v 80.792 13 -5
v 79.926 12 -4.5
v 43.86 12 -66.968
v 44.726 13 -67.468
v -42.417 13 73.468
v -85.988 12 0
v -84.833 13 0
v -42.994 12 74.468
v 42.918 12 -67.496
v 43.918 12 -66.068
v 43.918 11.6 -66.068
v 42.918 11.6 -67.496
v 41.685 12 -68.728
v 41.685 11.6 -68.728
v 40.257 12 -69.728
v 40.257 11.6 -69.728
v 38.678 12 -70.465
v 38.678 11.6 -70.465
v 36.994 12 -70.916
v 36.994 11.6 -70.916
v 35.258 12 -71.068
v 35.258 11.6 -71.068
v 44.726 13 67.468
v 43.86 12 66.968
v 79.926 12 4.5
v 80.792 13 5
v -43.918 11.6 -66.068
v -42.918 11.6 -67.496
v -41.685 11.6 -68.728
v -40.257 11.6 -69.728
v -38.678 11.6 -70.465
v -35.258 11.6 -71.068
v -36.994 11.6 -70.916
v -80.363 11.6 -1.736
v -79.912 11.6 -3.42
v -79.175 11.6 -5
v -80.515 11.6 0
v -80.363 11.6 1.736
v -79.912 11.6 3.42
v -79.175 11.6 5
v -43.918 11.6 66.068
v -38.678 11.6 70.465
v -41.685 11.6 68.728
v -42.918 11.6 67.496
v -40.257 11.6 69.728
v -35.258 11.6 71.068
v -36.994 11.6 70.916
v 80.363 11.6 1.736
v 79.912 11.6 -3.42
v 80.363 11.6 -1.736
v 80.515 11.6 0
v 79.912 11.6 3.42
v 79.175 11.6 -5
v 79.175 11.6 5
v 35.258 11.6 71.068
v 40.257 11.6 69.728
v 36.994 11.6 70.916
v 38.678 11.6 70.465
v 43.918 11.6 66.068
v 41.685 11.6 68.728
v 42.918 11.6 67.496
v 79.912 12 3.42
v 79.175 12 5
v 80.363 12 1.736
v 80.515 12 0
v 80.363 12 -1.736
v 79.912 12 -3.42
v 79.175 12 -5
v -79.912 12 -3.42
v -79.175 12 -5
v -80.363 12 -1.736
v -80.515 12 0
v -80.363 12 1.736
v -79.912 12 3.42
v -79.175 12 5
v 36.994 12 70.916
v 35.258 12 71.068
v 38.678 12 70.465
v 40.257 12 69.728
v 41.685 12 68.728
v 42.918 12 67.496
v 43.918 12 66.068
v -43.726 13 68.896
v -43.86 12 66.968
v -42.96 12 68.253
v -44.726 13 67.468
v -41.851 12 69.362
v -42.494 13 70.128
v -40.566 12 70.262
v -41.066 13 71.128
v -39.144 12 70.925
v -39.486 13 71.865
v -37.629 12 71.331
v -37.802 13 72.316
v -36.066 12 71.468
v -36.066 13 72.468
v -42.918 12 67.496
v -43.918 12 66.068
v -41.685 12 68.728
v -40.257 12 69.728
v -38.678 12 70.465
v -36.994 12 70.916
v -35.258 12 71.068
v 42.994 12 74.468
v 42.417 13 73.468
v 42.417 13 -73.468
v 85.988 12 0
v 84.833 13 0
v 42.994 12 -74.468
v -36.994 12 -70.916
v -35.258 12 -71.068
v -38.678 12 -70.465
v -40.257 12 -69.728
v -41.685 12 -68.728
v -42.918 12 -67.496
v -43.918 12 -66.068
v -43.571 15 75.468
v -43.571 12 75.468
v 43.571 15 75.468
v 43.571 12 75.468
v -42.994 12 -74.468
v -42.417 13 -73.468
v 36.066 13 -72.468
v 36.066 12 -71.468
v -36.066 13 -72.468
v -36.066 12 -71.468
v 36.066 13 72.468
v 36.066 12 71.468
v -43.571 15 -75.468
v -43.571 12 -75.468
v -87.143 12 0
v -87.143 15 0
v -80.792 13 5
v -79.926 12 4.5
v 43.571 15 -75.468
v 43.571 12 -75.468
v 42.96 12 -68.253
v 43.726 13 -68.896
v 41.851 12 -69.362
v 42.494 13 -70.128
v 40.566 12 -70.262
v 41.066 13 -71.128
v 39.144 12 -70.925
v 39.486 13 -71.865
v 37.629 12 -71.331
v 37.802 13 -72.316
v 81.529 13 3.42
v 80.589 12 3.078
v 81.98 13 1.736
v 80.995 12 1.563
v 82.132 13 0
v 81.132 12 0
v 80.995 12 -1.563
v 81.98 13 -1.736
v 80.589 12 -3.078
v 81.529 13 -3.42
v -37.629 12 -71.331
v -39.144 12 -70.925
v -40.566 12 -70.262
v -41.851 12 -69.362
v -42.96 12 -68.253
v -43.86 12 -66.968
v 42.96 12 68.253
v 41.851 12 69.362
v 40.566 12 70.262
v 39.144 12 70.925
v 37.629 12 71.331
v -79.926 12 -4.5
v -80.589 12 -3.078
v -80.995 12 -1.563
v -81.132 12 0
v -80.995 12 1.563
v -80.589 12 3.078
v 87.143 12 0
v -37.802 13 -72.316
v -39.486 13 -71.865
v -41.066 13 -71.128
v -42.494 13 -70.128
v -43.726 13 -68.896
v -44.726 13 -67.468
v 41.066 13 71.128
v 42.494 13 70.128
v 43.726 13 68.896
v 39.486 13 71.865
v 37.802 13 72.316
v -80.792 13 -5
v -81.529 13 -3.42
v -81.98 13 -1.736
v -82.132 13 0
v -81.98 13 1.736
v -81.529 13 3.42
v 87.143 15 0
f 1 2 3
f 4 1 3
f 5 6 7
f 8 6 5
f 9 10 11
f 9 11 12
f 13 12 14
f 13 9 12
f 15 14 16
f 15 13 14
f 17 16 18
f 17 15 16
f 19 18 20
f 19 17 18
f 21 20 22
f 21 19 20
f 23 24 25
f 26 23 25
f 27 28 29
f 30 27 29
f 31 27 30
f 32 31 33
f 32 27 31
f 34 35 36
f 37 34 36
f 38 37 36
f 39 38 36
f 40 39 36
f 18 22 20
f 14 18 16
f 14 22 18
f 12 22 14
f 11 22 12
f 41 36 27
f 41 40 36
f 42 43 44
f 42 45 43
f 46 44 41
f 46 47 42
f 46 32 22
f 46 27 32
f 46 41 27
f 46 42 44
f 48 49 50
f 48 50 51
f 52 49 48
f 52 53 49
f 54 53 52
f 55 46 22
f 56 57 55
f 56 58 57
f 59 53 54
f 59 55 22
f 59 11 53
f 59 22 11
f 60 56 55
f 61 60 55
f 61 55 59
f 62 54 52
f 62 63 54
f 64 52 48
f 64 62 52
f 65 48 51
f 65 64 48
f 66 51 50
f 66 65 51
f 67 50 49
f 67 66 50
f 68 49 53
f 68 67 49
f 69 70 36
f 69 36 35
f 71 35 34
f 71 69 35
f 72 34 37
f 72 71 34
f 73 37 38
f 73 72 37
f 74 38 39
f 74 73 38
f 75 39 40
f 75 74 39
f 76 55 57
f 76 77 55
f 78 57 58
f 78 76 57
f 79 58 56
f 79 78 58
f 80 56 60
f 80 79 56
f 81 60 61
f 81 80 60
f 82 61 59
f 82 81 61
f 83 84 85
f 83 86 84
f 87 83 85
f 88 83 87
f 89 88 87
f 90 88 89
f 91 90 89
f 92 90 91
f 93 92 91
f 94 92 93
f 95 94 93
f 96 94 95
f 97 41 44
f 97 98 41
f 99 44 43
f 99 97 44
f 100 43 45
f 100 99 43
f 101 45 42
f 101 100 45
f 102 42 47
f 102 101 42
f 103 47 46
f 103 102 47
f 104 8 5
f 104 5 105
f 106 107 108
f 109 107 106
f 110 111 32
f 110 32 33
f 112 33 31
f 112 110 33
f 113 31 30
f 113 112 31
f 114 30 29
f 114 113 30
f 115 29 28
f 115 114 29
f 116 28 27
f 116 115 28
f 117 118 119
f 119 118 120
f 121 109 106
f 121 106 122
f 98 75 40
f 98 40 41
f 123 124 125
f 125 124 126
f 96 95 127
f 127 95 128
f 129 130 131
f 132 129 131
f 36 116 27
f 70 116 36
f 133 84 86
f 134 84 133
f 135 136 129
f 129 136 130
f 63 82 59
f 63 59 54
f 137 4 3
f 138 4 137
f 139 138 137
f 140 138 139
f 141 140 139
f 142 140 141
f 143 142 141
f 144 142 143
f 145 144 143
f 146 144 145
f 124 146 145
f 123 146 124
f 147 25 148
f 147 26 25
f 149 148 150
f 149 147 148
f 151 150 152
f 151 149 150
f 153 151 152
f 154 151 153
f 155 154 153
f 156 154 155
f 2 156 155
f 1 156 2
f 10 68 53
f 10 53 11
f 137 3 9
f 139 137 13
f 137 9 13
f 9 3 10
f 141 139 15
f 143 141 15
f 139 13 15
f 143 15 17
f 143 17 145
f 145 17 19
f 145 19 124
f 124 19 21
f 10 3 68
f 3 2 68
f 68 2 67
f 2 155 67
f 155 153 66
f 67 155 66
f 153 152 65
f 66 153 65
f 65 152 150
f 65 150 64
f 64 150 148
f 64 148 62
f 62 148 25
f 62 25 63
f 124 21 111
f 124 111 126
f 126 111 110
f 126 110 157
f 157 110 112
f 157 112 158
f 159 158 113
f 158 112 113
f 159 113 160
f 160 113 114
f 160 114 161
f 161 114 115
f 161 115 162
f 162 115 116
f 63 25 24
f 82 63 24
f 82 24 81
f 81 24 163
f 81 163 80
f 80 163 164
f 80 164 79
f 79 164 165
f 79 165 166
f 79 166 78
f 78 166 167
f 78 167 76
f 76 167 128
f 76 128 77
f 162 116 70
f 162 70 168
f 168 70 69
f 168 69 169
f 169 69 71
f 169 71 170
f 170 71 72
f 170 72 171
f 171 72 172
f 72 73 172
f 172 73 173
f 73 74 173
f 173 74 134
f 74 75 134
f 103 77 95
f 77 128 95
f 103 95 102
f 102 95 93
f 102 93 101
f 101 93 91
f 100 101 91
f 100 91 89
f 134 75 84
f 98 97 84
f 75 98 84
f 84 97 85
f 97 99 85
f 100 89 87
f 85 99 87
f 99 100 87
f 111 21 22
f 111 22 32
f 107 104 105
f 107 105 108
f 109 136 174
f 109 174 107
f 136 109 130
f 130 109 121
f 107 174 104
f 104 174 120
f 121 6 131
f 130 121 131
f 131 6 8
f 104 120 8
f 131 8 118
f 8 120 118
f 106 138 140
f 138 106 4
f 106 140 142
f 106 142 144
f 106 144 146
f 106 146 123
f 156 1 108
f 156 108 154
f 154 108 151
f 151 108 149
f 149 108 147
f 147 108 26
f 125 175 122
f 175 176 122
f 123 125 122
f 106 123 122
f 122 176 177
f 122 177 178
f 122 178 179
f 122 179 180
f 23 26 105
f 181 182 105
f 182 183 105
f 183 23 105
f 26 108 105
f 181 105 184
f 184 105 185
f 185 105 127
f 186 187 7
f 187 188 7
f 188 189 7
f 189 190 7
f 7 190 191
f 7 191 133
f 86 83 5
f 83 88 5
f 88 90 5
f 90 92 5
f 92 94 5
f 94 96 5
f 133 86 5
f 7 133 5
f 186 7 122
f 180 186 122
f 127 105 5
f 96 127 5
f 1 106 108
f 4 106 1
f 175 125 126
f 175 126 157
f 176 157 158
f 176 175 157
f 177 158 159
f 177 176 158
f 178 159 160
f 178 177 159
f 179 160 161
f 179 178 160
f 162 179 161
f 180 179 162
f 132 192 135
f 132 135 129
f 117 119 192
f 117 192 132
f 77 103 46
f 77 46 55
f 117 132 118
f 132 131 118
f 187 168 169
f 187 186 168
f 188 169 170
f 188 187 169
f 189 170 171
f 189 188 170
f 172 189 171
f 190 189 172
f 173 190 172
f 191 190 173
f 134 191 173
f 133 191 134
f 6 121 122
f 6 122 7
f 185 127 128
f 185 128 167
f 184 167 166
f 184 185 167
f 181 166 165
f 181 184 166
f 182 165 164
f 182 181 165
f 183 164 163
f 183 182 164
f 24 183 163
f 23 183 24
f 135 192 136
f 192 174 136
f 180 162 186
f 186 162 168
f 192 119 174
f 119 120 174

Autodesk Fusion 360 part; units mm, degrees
sketch "Sketch1" plane through (0, 12, 0) normal (0, -1, 0) x (1, 0, 0)
  line L0 (-41.8393, 72.4678) -> (-83.6786, 0)
  line L1 (-83.6786, 0) -> (-41.8393, -72.4678)
  line L2 (-41.8393, -72.4678) -> (41.8393, -72.4678)
  line L3 (41.8393, -72.4678) -> (83.6786, 0)
  line L4 (83.6786, 0) -> (41.8393, 72.4678)
  line L5 (41.8393, 72.4678) -> (-41.8393, 72.4678)
  line L6 (-41.8393, 72.4678) -> (41.8393, 72.4678)
  line L7 (41.8393, 72.4678) -> (83.6786, 0)
  line L8 (83.6786, 0) -> (41.8393, -72.4678)
  line L9 (41.8393, -72.4678) -> (-41.8393, -72.4678)
  line L10 (-41.8393, -72.4678) -> (-83.6786, 0)
  line L11 (-83.6786, 0) -> (-41.8393, 72.4678)
  line L12 (82.0621, 0) -> (41.031, -71.0678)
  line L13 (41.031, -71.0678) -> (-41.031, -71.0678)
  line L14 (-41.031, -71.0678) -> (-82.0621, 0)
  line L15 (-82.0621, 0) -> (-41.031, 71.0678)
  line L16 (-41.031, 71.0678) -> (41.031, 71.0678)
  line L17 (41.031, 71.0678) -> (82.0621, 0)
  dimension "d1" = 1.4
sketch "Sketch2" plane through (0, 12, 0) normal (0, 1, 0) x (-1, 0, 0)
  line L0 (-42.4167, 73.4678) -> (42.4167, 73.4678)
  line L1 (42.4167, 73.4678) -> (84.8333, 0)
  line L2 (84.8333, 0) -> (42.4167, -73.4678)
  line L3 (42.4167, -73.4678) -> (-42.4167, -73.4678)
  line L4 (-42.4167, -73.4678) -> (-84.8333, 0)
  line L5 (-84.8333, 0) -> (-42.4167, 73.4678)
  line L6 (-43.5714, 75.4678) -> (-87.1427, 0)
  line L7 (-87.1427, 0) -> (-43.5714, -75.4678)
  line L8 (-43.5714, -75.4678) -> (43.5714, -75.4678)
  line L9 (43.5714, -75.4678) -> (87.1427, 0)
  line L10 (87.1427, 0) -> (43.5714, 75.4678)
  line L11 (43.5714, 75.4678) -> (-43.5714, 75.4678)
  line L12 (-43.5714, 75.4678) -> (43.5714, 75.4678)
  line L13 (87.1427, 0) -> (43.5714, 75.4678)
  line L14 (87.1427, 0) -> (43.5714, -75.4678)
  line L15 (43.5714, -75.4678) -> (-43.5714, -75.4678)
  line L16 (-43.5714, -75.4678) -> (-87.1427, 0)
  line L17 (-87.1427, 0) -> (-43.5714, 75.4678)
sketch "Sketch3" plane through (0, 4, 0) normal (0, 1, 0) x (-1, 0, 0)
  line L0 (-38.9526, -67.4678) -> (-77.9051, 0)
  line L1 (-77.9051, 0) -> (-38.9526, 67.4678)
  line L2 (-38.9526, 67.4678) -> (38.9526, 67.4678)
  line L3 (38.9526, 67.4678) -> (77.9051, 0)
  line L4 (77.9051, 0) -> (38.9526, -67.4678)
  line L5 (38.9526, -67.4678) -> (-38.9526, -67.4678)
  line L6 (-84.8333, 0) -> (-42.4167, -73.4678)
  line L7 (-42.4167, -73.4678) -> (42.4167, -73.4678)
  line L8 (42.4167, -73.4678) -> (84.8333, 0)
  line L9 (84.8333, 0) -> (42.4167, 73.4678)
  line L10 (42.4167, 73.4678) -> (-42.4167, 73.4678)
  line L11 (-42.4167, 73.4678) -> (-84.8333, 0)
  line L12 (42.4167, -73.4678) -> (84.8333, 0)
  line L13 (42.4167, 73.4678) -> (84.8333, 0)
  line L14 (42.4167, 73.4678) -> (-42.4167, 73.4678)
  line L15 (-42.4167, 73.4678) -> (-84.8333, 0)
  line L16 (-84.8333, 0) -> (-42.4167, -73.4678)
  line L17 (-42.4167, -73.4678) -> (42.4167, -73.4678)
  line L18 (-42.4167, 73.4678) -> (-84.8333, 0)
  line L19 (-41.8393, -72.4678) -> (41.8393, -72.4678)
  line L20 (41.8393, -72.4678) -> (83.6786, 0)
  line L21 (41.8393, 72.4678) -> (83.6786, 0)
  line L22 (41.8393, 72.4678) -> (-41.8393, 72.4678)
  line L23 (-41.8393, 72.4678) -> (-83.6786, 0)
  line L24 (-83.6786, 0) -> (-41.8393, -72.4678)
  line L25 (41.031, 71.0678) -> (-41.031, 71.0678)
  line L26 (-41.031, 71.0678) -> (-82.0621, 0)
  line L27 (-82.0621, 0) -> (-41.031, -71.0678)
  line L28 (-41.031, -71.0678) -> (41.031, -71.0678)
  line L29 (41.031, -71.0678) -> (82.0621, 0)
  line L30 (41.031, 71.0678) -> (82.0621, 0)
  dimension "d2" = -1
  dimension "d3" = -2.4
sketch "Sketch4" plane through (0, 13, 0) normal (0, -1, 0) x (1, 0, 0)
  arc A0 (44.7261, 67.4678) -> (36.0658, 72.4678) centre (36.0658, 62.4678) ccw
  line L0 (44.7261, 67.4678) -> (80.7919, 5)
  arc A1 (80.7919, -5) -> (80.7919, 5) centre (72.1316, 0) ccw
  line L1 (80.7919, -5) -> (44.7261, -67.4678)
  arc A2 (36.0658, -72.4678) -> (44.7261, -67.4678) centre (36.0658, -62.4678) ccw
  line L2 (36.0658, -72.4678) -> (-36.0658, -72.4678)
  arc A3 (-44.7261, -67.4678) -> (-36.0658, -72.4678) centre (-36.0658, -62.4678) ccw
  line L3 (-44.7261, -67.4678) -> (-80.7919, -5)
  arc A4 (-80.7919, 5) -> (-80.7919, -5) centre (-72.1316, 0) ccw
  line L4 (-80.7919, 5) -> (-44.7261, 67.4678)
  arc A5 (-36.0658, 72.4678) -> (-44.7261, 67.4678) centre (-36.0658, 62.4678) ccw
  line L5 (-36.0658, 72.4678) -> (36.0658, 72.4678)
  line L6 (42.4167, 73.4678) -> (-42.4167, 73.4678)
  line L7 (-42.4167, 73.4678) -> (-84.8333, 0)
  line L8 (-84.8333, 0) -> (-42.4167, -73.4678)
  line L9 (-42.4167, -73.4678) -> (42.4167, -73.4678)
  line L10 (42.4167, -73.4678) -> (84.8333, 0)
  line L11 (84.8333, 0) -> (42.4167, 73.4678)
  line L12 (-42.4167, 73.4678) -> (-32.4167, 73.4678)
  line L13 (-42.4167, 73.4678) -> (-47.4167, 64.8076)
  line L14 (-32.4167, 73.4678) -> (-32.4167, 56.1473)
  line L15 (-47.4167, 64.8076) -> (-32.4167, 56.1473)
  dimension "d4" = 10
  dimension "d5" = 0
extrude "Extrude1" add sketch "Sketch2" along normal blind 3 contours L0 L1 L2 L3 L4 L5 | L6 L7 L8 L9 L10 L11 L12 L13 L14 L15 L16 L17
extrude "Extrude2" cut sketch "Sketch3" along normal blind -1 and the other way blind -9 contours L6 L7 L8 L9 L10 L11 L12 L13 L14 L15 L16 L17 L18
move_face "OffsetFaces1" [suppressed]
extrude "Extrude3" cut sketch "Sketch1" against normal blind 2.6 contours L12 L13 L14 L15 L16 L17
fillet "Fillet1" radius 10 6 edges at (-83.6786, 12.5, 0) (-41.8393, 12.5, 72.4678) (41.8393, 12.5, 72.4678) (83.6786, 12.5, 0) (41.8393, 12.5, -72.4678) (-41.8393, 12.5, -72.4678)
fillet "Fillet1" radius 10 6 edges at (-41.031, 13.3, 71.0678) (-82.0621, 13.3, 0) (-41.031, 13.3, -71.0678) (41.031, 13.3, -71.0678) (82.0621, 13.3, 0) (41.031, 13.3, 71.0678)
chamfer "Chamfer1" distance 1 angle 45 18 edges at (63.625, 12, 36.7339) (63.625, 12, -36.7339) (82.1316, 12, 0) (62.759, 12, -36.2339) (41.0658, 12, -71.1281) (0, 12, -72.4678) (-41.0658, 12, -71.1281) (-62.759, 12, -36.2339) (-82.1316, 12, 0) (-62.759, 12, 36.2339) (-41.0658, 12, 71.1281) (0, 12, 72.4678) (41.0658, 12, 71.1281) (62.759, 12, 36.2339) (0, 12, 73.4678) (-63.625, 12, 36.7339) (-63.625, 12, -36.7339) (0, 12, -73.4678)
sketch "Sketch5" plane through (0, 14.6, 0) normal (0, -1, 0) x (1, 0, 0)
  arc A0 (43.9178, 66.0678) -> (35.2575, 71.0678) centre (35.2575, 61.0678) ccw
  line L0 (35.2575, 71.0678) -> (-35.2575, 71.0678)
  arc A1 (-35.2575, 71.0678) -> (-43.9178, 66.0678) centre (-35.2575, 61.0678) ccw
  line L1 (-43.9178, 66.0678) -> (-79.1753, 5)
  arc A2 (-79.1753, 5) -> (-79.1753, -5) centre (-70.515, 0) ccw
  line L2 (-79.1753, -5) -> (-43.9178, -66.0678)
  arc A3 (-43.9178, -66.0678) -> (-35.2575, -71.0678) centre (-35.2575, -61.0678) ccw
  line L3 (-35.2575, -71.0678) -> (35.2575, -71.0678)
  arc A4 (35.2575, -71.0678) -> (43.9178, -66.0678) centre (35.2575, -61.0678) ccw
  line L4 (43.9178, -66.0678) -> (79.1753, -5)
  arc A5 (79.1753, -5) -> (79.1753, 5) centre (70.515, 0) ccw
  line L5 (79.1753, 5) -> (43.9178, 66.0678)
  line L6 (0, 0) -> (-80.515, 0)
  line L7 (-40.2575, 69.7281) -> (0, 0)
  line L8 (40.2575, 69.7281) -> (-40.2575, -69.7281)
  line L9 (40.2575, -69.7281) -> (0, 0)
  line L10 (80.515, 0) -> (0, 0)
extrude "Extrude11" add 1 faces at (2.8868, 14.6, -1.6667) along direction (0, -1, 0) blind 3
extrude "Extrude5" [suppressed]
extrude "Extrude6" [suppressed]
extrude "Extrude7" [suppressed]
extrude "Extrude8" [suppressed]
extrude "Extrude9" [suppressed]
sketch "Sketch6" plane through (0, 12, 0) normal (0, -1, 0) x (1, 0, 0)
  line L0 (-35.2575, 71.0678) -> (35.2575, 71.0678)
  arc A0 (43.9178, 66.0678) -> (35.2575, 71.0678) centre (35.2575, 61.0678) ccw
  line L1 (43.9178, 66.0678) -> (79.1753, 5)
  arc A1 (79.1753, -5) -> (79.1753, 5) centre (70.515, 0) ccw
  line L2 (79.1753, -5) -> (43.9178, -66.0678)
  arc A2 (35.2575, -71.0678) -> (43.9178, -66.0678) centre (35.2575, -61.0678) ccw
  line L3 (35.2575, -71.0678) -> (-35.2575, -71.0678)
  arc A3 (-43.9178, -66.0678) -> (-35.2575, -71.0678) centre (-35.2575, -61.0678) ccw
  line L4 (-43.9178, -66.0678) -> (-79.1753, -5)
  arc A4 (-79.1753, 5) -> (-79.1753, -5) centre (-70.515, 0) ccw
  line L5 (-79.1753, 5) -> (-43.9178, 66.0678)
  line L6 (-43.86, 66.9678) -> (-79.9259, 4.5)
  arc A5 (-79.9259, 4.5) -> (-79.9259, -4.5) centre (-72.1316, 0) ccw
  line L7 (-79.9259, -4.5) -> (-43.86, -66.9678)
  arc A6 (-43.86, -66.9678) -> (-36.0658, -71.4678) centre (-36.0658, -62.4678) ccw
  line L8 (-36.0658, -71.4678) -> (36.0658, -71.4678)
  arc A7 (36.0658, -71.4678) -> (43.86, -66.9678) centre (36.0658, -62.4678) ccw
  line L9 (43.86, -66.9678) -> (79.9259, -4.5)
  arc A8 (79.9259, -4.5) -> (79.9259, 4.5) centre (72.1316, 0) ccw
  line L10 (79.9259, 4.5) -> (43.86, 66.9678)
  arc A9 (43.86, 66.9678) -> (36.0658, 71.4678) centre (36.0658, 62.4678) ccw
  line L11 (36.0658, 71.4678) -> (-36.0658, 71.4678)
  arc A10 (-35.2575, 71.0678) -> (-43.9178, 66.0678) centre (-35.2575, 61.0678) ccw
  arc A11 (-36.0658, 71.4678) -> (-43.86, 66.9678) centre (-36.0658, 62.4678) ccw
  line L12 (-79.1753, 5) -> (-43.9178, 66.0678)
  arc A12 (-35.2575, 71.0678) -> (-43.9178, 66.0678) centre (-35.2575, 61.0678) ccw
  line L13 (-35.2575, 71.0678) -> (35.2575, 71.0678)
  arc A13 (43.9178, 66.0678) -> (35.2575, 71.0678) centre (35.2575, 61.0678) ccw
  line L14 (43.9178, 66.0678) -> (79.1753, 5)
  arc A14 (79.1753, -5) -> (79.1753, 5) centre (70.515, 0) ccw
  line L15 (79.1753, -5) -> (43.9178, -66.0678)
  arc A15 (35.2575, -71.0678) -> (43.9178, -66.0678) centre (35.2575, -61.0678) ccw
  line L16 (35.2575, -71.0678) -> (-35.2575, -71.0678)
  arc A16 (-43.9178, -66.0678) -> (-35.2575, -71.0678) centre (-35.2575, -61.0678) ccw
  line L17 (-43.9178, -66.0678) -> (-79.1753, -5)
  arc A17 (-79.1753, 5) -> (-79.1753, -5) centre (-70.515, 0) ccw
  arc A18 (79.9259, -4.5) -> (79.9259, 4.5) centre (72.1316, 0) ccw
  line L18 (79.9259, 4.5) -> (43.86, 66.9678)
  arc A19 (43.86, 66.9678) -> (36.0658, 71.4678) centre (36.0658, 62.4678) ccw
  line L19 (36.0658, 71.4678) -> (-36.0658, 71.4678)
  arc A20 (-36.0658, 71.4678) -> (-43.86, 66.9678) centre (-36.0658, 62.4678) ccw
  line L20 (-43.86, 66.9678) -> (-79.9259, 4.5)
  arc A21 (-79.9259, 4.5) -> (-79.9259, -4.5) centre (-72.1316, 0) ccw
  line L21 (-79.9259, -4.5) -> (-43.86, -66.9678)
  arc A22 (-43.86, -66.9678) -> (-36.0658, -71.4678) centre (-36.0658, -62.4678) ccw
  line L22 (-36.0658, -71.4678) -> (36.0658, -71.4678)
  arc A23 (36.0658, -71.4678) -> (43.86, -66.9678) centre (36.0658, -62.4678) ccw
  line L23 (43.86, -66.9678) -> (79.9259, -4.5)
  arc A24 (42.8785, 65.4678) -> (35.2575, 69.8678) centre (35.2575, 61.0678) ccw
  line L24 (-35.2575, 69.8678) -> (35.2575, 69.8678)
  arc A25 (-35.2575, 69.8678) -> (-42.8785, 65.4678) centre (-35.2575, 61.0678) ccw
  line L25 (-78.1361, 4.4) -> (-42.8785, 65.4678)
  arc A26 (-78.1361, 4.4) -> (-78.1361, -4.4) centre (-70.515, 0) ccw
  line L26 (-42.8785, -65.4678) -> (-78.1361, -4.4)
  arc A27 (-42.8785, -65.4678) -> (-35.2575, -69.8678) centre (-35.2575, -61.0678) ccw
  line L27 (35.2575, -69.8678) -> (-35.2575, -69.8678)
  arc A28 (35.2575, -69.8678) -> (42.8785, -65.4678) centre (35.2575, -61.0678) ccw
  line L28 (78.1361, -4.4) -> (42.8785, -65.4678)
  arc A29 (78.1361, -4.4) -> (78.1361, 4.4) centre (70.515, 0) ccw
  line L29 (42.8785, 65.4678) -> (78.1361, 4.4)
  arc A30 (-35.2575, 70.0678) -> (-43.0518, 65.5678) centre (-35.2575, 61.0678) ccw
  line L30 (-78.3093, 4.5) -> (-43.0518, 65.5678)
  arc A31 (-78.3093, 4.5) -> (-78.3093, -4.5) centre (-70.515, 0) ccw
  line L31 (-43.0518, -65.5678) -> (-78.3093, -4.5)
  arc A32 (-43.0518, -65.5678) -> (-35.2575, -70.0678) centre (-35.2575, -61.0678) ccw
  line L32 (35.2575, -70.0678) -> (-35.2575, -70.0678)
  arc A33 (35.2575, -70.0678) -> (43.0518, -65.5678) centre (35.2575, -61.0678) ccw
  line L33 (78.3093, -4.5) -> (43.0518, -65.5678)
  arc A34 (78.3093, -4.5) -> (78.3093, 4.5) centre (70.515, 0) ccw
  line L34 (43.0518, 65.5678) -> (78.3093, 4.5)
  arc A35 (43.0518, 65.5678) -> (35.2575, 70.0678) centre (35.2575, 61.0678) ccw
  line L35 (-35.2575, 70.0678) -> (35.2575, 70.0678)
  dimension "d16" = 1.2
  dimension "d17" = 1
extrude "Extrude10" [suppressed]
extrude "Extrude4" [suppressed]
chamfer "Chamfer2" [suppressed]
equation "d5 = d154"
